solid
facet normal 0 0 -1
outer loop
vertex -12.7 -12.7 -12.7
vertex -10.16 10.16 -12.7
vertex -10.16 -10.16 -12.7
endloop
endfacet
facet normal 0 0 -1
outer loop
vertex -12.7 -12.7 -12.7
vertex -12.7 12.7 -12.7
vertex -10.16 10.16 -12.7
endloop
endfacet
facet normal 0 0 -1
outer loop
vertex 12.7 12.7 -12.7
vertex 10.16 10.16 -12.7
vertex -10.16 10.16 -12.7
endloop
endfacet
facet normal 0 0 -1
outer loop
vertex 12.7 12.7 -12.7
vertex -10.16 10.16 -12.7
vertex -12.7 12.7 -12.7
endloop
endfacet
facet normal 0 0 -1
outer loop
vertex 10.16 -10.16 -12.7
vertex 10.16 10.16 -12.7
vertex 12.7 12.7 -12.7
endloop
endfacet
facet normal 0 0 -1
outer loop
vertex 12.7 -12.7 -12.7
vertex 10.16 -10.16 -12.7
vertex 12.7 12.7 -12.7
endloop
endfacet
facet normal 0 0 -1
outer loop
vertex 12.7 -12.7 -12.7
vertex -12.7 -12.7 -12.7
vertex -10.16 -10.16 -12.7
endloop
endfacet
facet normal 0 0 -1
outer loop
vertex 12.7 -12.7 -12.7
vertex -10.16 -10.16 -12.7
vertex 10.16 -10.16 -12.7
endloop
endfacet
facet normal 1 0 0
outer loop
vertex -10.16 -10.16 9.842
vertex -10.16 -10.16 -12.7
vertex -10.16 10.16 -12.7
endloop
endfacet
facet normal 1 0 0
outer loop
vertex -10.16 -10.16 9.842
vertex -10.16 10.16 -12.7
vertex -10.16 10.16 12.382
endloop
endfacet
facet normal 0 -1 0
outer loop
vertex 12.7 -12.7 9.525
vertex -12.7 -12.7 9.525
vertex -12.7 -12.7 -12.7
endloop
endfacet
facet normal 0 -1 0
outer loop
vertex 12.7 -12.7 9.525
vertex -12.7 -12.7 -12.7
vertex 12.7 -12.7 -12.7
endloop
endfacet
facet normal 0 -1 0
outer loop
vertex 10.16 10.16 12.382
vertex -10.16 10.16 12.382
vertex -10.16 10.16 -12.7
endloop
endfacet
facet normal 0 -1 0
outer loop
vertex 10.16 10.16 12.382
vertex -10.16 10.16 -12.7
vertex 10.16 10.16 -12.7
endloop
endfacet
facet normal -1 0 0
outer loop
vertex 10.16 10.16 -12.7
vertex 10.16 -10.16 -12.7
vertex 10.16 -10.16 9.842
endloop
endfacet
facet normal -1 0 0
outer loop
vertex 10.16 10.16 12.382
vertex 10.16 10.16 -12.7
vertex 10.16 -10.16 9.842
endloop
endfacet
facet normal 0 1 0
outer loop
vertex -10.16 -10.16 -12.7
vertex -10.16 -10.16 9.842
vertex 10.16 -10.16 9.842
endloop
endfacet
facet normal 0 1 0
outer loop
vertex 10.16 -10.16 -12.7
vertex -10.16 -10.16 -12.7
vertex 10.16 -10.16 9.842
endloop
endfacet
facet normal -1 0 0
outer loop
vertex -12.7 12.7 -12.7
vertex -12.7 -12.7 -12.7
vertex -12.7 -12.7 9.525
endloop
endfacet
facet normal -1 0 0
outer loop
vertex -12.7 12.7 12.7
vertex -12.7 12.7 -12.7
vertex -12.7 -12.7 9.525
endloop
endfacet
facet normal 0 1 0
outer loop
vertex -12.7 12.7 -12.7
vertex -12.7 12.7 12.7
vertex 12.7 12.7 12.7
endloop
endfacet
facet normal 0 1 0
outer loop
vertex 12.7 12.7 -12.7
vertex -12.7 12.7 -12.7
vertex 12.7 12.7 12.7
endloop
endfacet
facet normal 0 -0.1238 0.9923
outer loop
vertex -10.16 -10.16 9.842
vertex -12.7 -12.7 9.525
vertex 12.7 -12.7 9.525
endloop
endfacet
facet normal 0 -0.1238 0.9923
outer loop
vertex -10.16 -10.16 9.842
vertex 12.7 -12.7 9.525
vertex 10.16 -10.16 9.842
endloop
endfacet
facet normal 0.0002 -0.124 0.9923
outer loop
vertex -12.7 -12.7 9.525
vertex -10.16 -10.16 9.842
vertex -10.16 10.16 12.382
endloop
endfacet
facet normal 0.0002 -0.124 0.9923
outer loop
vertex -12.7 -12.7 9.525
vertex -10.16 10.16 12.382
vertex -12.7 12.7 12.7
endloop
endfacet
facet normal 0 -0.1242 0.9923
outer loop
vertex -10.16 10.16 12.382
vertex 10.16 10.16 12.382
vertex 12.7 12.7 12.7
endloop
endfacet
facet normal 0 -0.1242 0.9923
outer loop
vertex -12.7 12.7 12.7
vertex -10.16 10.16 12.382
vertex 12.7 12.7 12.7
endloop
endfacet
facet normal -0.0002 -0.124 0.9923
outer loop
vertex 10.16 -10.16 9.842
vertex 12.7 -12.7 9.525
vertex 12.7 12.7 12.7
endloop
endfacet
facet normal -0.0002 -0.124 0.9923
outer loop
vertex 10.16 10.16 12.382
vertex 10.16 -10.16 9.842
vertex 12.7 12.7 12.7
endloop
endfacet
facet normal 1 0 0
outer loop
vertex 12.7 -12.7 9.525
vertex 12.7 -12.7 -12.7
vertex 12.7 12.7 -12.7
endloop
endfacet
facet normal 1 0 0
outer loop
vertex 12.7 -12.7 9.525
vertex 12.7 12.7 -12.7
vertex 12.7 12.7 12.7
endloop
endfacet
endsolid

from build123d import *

# Parameters (mm, degrees)
F0_W     = 25.4
F0_H     = 25.4
F1_DEPTH = 12.7
F2_T     = -2.54
F4_DEPTH = 25.401


with BuildPart() as f1:
    # F0 (on Front) → F1 (new body, symmetric)
    with BuildSketch(Plane.XZ):
        Rectangle(F0_W, F0_H)
    extrude(amount=F1_DEPTH, both=True)

    # F2
    f2_openings = [f1.faces().sort_by_distance(p)[0] for p in [
        (0, 0, 12.7),
        (0, 0, -12.7),
    ]]
    offset(amount=F2_T, openings=f2_openings)

    # F3 (on face) → F4 (cut, through all)
    with BuildSketch(Plane.YZ.offset(12.7)):
        Polygon((-12.7, 12.7), (-12.7, 9.525), (12.7, 12.7), align=None)
    extrude(amount=-F4_DEPTH, mode=Mode.SUBTRACT)


solid = f1.part
